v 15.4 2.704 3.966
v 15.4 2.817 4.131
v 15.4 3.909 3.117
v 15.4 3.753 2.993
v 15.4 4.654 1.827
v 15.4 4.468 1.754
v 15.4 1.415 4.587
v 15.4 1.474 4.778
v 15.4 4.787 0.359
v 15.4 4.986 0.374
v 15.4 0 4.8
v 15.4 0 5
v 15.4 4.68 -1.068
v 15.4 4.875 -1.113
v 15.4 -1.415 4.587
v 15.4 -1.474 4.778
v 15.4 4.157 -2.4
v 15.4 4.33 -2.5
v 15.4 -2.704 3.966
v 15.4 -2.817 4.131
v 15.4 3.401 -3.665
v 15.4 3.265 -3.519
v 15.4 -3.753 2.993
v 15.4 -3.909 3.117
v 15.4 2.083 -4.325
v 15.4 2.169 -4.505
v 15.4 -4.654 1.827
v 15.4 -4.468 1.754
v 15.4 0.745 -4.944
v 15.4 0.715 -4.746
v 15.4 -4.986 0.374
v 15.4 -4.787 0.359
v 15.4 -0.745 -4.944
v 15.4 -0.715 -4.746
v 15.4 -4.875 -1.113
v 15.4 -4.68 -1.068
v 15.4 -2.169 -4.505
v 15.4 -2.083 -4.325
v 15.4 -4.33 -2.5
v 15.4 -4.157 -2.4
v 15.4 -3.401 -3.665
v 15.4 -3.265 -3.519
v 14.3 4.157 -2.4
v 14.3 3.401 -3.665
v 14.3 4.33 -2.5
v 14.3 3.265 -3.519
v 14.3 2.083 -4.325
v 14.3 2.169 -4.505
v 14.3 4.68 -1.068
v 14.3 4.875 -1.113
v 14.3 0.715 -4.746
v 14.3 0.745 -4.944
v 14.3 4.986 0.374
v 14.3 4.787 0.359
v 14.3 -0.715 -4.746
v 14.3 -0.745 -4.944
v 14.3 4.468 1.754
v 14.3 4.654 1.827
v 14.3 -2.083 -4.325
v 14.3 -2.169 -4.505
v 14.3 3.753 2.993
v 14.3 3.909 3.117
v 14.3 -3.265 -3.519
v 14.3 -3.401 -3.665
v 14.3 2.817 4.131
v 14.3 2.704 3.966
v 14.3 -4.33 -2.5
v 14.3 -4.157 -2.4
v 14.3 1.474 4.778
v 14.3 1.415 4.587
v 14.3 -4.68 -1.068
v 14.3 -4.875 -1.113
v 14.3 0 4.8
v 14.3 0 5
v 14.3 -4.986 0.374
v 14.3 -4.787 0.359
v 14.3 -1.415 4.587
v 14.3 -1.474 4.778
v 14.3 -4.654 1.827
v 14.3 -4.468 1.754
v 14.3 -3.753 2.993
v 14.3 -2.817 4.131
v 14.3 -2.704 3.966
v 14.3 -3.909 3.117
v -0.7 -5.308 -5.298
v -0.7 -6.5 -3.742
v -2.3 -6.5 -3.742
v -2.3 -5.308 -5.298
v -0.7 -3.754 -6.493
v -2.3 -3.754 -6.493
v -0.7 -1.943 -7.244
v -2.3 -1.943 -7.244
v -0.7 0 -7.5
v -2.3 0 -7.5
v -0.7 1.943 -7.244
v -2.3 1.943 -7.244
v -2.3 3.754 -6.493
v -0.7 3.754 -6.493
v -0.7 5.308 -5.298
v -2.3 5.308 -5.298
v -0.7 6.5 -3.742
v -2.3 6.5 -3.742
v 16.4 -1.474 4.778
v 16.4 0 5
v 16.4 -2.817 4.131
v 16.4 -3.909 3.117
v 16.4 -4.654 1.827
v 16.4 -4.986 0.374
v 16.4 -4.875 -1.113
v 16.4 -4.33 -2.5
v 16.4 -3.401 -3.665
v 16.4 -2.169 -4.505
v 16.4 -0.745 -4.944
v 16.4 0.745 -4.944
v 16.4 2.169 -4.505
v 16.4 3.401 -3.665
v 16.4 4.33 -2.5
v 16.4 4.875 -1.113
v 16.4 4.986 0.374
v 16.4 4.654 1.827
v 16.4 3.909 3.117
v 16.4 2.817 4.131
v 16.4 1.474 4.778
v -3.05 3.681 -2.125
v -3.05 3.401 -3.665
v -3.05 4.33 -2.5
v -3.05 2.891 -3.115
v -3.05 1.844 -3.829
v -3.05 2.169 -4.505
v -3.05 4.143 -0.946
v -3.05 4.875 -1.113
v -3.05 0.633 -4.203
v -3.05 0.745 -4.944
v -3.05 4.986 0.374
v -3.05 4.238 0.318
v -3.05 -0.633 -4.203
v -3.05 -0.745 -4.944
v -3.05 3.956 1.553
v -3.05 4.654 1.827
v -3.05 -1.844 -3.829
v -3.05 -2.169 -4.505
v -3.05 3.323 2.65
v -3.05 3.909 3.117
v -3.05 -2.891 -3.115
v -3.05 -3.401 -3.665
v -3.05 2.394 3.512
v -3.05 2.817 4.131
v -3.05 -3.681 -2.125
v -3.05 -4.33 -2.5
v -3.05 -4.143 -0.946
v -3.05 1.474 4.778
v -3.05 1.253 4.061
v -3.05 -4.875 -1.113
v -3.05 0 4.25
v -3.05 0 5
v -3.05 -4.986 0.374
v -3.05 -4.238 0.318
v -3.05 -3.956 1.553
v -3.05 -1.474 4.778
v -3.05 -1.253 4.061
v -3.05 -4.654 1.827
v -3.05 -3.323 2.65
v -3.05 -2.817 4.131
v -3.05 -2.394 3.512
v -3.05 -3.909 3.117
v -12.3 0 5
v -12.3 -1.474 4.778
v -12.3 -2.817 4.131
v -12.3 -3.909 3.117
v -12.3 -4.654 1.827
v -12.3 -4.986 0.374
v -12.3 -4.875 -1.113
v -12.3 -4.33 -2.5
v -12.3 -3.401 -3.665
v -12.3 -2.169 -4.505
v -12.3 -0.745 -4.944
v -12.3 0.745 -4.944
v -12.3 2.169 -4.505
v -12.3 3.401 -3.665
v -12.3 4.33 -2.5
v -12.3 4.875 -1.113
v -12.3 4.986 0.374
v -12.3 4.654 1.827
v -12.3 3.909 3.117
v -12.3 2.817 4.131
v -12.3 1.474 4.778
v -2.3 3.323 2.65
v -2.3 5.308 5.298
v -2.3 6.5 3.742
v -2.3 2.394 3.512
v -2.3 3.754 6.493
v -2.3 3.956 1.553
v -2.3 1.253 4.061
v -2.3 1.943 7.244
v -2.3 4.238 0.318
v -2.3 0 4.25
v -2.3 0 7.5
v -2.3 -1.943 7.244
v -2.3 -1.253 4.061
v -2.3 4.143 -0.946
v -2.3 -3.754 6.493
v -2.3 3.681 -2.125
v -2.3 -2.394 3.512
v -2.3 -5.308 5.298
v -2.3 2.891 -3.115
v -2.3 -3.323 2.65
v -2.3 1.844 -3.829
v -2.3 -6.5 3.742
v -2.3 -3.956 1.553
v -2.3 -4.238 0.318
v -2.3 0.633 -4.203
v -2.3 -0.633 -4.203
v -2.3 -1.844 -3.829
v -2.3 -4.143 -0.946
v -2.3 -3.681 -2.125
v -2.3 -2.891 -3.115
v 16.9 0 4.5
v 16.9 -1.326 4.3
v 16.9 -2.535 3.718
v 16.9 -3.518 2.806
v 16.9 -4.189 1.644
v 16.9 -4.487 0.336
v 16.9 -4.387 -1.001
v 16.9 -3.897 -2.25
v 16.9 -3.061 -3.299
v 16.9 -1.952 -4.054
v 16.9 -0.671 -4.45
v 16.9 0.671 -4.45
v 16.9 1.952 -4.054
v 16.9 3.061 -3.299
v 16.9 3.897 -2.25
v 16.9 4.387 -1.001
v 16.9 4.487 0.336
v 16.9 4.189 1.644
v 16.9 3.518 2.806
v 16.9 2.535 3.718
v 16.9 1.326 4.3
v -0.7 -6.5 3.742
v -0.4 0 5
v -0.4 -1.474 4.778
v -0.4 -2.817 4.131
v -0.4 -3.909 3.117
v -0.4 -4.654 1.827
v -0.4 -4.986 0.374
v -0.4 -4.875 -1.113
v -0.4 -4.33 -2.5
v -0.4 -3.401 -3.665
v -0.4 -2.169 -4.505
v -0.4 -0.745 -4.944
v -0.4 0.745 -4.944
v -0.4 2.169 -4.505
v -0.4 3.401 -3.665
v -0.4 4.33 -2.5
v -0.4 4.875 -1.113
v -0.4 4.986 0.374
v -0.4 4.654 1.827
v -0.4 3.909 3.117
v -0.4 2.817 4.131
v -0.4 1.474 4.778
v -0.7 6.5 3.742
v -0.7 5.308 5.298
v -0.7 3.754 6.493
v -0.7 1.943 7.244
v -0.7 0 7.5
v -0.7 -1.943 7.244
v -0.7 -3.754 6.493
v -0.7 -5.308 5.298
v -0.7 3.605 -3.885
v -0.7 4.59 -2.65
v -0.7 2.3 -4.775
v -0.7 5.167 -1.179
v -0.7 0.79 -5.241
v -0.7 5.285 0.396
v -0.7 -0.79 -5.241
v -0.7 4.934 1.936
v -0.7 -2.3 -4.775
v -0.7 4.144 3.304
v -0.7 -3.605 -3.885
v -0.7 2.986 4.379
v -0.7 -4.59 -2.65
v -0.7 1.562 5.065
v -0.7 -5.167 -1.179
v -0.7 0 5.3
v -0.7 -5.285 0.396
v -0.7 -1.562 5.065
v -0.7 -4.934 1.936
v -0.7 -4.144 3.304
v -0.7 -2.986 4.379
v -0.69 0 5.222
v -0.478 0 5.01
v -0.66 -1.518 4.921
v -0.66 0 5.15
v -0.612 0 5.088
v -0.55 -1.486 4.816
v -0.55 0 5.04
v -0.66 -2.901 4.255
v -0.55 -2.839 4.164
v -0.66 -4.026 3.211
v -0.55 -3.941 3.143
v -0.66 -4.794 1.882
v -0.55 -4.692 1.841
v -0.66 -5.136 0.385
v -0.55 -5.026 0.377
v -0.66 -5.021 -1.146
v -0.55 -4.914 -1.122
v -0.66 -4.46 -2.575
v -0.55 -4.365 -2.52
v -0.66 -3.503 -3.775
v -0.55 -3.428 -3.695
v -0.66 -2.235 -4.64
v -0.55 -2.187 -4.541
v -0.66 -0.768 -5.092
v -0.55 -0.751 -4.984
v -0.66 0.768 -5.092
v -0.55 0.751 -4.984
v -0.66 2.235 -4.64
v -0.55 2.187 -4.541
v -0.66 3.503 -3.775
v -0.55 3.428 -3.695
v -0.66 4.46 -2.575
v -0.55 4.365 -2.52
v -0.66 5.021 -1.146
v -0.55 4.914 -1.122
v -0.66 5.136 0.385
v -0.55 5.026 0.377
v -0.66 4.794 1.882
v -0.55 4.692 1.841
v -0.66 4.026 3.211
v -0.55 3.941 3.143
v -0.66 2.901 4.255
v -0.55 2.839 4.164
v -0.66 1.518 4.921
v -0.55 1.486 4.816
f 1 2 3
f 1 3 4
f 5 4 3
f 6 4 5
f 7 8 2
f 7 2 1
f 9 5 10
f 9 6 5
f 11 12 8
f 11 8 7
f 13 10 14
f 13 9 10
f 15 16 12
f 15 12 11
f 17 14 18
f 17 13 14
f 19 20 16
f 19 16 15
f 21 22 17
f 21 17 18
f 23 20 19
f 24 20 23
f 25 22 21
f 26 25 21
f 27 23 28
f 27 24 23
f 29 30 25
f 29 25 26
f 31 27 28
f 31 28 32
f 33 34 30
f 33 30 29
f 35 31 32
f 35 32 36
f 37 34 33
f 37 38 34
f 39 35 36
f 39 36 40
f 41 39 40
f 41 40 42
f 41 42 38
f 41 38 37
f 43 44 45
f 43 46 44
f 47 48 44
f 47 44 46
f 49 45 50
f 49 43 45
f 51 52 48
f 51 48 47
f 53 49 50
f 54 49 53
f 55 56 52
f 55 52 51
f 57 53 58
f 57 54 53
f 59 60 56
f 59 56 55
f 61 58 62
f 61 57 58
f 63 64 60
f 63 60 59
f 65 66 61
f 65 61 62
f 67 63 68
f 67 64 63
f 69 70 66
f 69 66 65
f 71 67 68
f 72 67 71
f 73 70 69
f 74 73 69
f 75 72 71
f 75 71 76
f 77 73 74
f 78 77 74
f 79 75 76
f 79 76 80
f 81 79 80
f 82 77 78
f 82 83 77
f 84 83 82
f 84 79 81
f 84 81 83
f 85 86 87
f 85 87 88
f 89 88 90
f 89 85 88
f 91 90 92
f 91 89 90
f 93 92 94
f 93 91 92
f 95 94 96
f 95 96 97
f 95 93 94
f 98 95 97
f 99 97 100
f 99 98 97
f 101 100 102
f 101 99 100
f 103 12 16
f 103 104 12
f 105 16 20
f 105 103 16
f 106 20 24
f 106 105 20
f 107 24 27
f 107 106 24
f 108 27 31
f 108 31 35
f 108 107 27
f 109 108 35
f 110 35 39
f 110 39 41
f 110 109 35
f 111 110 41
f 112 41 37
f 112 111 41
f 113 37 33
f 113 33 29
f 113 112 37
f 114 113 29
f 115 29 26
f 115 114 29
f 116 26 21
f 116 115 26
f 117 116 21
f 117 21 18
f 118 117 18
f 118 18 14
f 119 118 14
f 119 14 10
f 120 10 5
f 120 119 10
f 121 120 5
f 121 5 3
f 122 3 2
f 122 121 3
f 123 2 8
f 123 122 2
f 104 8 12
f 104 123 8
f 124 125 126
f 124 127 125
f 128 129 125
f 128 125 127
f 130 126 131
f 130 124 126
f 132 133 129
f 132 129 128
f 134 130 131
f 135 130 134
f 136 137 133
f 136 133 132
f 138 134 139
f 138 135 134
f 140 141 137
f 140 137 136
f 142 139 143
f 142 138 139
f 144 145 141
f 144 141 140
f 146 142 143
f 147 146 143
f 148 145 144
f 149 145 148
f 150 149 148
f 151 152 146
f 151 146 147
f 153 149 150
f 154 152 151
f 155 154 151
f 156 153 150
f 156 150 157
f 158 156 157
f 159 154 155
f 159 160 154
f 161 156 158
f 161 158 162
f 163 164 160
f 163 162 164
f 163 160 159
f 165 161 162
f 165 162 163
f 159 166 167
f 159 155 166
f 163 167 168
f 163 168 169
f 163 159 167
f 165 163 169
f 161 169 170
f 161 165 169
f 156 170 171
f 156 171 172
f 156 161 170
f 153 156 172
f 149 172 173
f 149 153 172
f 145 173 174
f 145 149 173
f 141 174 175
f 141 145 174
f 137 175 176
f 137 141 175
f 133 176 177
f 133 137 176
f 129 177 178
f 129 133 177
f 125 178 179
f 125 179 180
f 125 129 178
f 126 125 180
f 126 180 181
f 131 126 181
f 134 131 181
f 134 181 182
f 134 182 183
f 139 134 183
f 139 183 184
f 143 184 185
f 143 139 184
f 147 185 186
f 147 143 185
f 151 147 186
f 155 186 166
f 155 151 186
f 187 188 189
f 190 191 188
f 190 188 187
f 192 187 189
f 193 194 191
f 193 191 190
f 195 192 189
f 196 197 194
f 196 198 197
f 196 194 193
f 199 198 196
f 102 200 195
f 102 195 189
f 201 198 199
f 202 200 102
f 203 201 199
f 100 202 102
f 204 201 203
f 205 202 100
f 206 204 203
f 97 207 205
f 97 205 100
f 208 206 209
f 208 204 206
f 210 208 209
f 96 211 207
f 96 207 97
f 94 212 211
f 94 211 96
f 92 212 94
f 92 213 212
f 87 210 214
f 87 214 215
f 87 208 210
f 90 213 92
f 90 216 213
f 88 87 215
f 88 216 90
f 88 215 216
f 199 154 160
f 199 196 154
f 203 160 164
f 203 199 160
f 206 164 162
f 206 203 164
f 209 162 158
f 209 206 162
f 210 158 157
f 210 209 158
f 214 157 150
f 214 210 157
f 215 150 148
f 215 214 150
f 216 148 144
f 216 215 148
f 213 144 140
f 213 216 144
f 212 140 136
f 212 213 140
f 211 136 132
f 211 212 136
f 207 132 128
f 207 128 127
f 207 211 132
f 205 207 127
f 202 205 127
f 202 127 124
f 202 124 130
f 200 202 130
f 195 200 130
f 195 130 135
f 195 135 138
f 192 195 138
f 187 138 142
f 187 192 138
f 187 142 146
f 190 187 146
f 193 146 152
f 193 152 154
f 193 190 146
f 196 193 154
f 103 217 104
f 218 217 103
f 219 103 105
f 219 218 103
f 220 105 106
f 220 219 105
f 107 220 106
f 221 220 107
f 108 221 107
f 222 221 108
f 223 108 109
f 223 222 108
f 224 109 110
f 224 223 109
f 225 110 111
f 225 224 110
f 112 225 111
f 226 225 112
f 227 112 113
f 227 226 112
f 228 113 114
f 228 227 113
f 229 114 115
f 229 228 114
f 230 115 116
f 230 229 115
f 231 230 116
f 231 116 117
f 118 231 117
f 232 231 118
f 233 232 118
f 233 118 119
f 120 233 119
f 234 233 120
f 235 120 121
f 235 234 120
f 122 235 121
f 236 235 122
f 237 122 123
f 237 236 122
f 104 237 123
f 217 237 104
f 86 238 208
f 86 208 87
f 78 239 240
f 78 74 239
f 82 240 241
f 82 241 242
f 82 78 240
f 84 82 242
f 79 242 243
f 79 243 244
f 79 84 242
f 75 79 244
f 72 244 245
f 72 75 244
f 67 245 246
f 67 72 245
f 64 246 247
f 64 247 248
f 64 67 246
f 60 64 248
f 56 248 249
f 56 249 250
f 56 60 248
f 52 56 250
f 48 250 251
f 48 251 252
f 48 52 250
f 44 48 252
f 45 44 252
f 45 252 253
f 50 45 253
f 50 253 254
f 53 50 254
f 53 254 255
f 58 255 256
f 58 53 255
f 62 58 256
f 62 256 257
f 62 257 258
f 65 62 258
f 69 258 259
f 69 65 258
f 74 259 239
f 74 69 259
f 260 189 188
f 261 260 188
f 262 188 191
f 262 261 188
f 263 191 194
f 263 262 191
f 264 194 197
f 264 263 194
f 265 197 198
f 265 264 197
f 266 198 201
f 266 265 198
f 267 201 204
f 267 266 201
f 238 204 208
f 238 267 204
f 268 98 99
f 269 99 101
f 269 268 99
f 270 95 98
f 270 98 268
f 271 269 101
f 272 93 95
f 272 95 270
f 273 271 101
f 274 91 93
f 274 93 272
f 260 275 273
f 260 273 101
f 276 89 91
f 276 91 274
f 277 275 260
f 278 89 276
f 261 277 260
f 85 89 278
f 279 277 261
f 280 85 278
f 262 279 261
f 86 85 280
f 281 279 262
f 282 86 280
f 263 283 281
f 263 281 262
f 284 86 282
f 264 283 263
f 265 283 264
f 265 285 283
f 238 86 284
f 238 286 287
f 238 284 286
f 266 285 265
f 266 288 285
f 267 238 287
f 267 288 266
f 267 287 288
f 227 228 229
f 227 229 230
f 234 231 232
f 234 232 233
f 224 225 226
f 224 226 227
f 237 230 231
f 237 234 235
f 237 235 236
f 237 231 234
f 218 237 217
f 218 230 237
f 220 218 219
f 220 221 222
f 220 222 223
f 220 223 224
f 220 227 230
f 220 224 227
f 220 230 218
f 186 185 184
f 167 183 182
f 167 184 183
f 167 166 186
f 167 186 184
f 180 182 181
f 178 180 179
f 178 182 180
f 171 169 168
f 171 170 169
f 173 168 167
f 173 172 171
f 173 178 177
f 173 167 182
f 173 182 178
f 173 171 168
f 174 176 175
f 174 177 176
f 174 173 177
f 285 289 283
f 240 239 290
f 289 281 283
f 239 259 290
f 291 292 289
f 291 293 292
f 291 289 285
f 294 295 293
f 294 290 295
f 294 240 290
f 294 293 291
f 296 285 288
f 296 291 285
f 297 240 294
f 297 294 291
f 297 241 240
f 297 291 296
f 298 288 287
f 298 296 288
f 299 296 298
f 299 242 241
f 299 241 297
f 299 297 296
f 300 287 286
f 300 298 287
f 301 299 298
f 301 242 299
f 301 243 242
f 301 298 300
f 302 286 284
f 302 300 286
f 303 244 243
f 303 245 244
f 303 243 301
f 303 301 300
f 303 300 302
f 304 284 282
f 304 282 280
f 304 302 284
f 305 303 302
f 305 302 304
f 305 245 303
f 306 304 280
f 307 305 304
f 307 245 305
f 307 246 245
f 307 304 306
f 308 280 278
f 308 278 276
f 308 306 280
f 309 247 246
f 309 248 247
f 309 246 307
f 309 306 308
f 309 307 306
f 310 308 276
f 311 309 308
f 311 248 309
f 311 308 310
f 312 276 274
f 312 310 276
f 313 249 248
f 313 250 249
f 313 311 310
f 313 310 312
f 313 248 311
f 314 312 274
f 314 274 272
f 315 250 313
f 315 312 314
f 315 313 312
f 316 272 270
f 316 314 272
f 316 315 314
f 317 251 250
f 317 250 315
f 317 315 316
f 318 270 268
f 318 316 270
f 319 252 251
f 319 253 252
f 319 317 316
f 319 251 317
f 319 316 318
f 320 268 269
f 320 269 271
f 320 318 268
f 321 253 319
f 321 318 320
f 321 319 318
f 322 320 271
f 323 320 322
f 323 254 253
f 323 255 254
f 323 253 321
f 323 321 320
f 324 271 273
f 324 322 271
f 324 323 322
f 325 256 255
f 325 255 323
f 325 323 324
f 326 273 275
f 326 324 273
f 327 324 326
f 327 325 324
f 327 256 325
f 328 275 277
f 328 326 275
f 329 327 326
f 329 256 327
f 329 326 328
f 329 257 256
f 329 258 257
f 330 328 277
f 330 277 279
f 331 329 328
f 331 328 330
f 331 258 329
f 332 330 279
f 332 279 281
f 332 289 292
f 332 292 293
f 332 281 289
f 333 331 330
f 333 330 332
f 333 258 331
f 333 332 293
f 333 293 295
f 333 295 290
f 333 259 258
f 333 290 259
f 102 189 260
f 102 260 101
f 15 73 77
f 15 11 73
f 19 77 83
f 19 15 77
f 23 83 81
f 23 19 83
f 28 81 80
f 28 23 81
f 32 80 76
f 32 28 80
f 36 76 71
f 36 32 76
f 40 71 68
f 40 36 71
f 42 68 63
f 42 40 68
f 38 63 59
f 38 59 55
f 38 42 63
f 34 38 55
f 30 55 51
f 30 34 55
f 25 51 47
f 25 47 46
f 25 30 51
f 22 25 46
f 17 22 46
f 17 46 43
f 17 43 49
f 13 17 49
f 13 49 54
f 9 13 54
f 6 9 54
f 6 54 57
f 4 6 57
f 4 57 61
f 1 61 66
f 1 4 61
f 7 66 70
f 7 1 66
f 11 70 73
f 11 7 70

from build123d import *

# Parameters (mm, degrees)
SCHNITT_LINEAR_AUSTRAGEN2_DEPTH = 7.5


with BuildPart() as part:
    # Skizze1 → Rotation1 (revolve)
    with BuildSketch(Plane.XY, mode=Mode.PRIVATE) as rotation1_sk:
        with BuildLine():
            Line((14.3, 4.8), (15.4, 4.8))
            Line((15.4, 4.8), (15.4, 5))
            Line((15.4, 5), (16.4, 5))
            Line((16.4, 5), (16.9, 4.5))
            Line((16.9, 4.5), (16.9, 0))
            Line((16.9, 0), (-12.3, 0))
            Line((-12.3, 0), (-12.3, 5))
            Line((-12.3, 5), (-3.05, 5))
            Line((-3.05, 5), (-3.05, 4.25))
            Line((-3.05, 4.25), (-2.3, 4.25))
            Line((-2.3, 4.25), (-2.3, 7.5))
            Line((-2.3, 7.5), (-0.7, 7.5))
            Line((-0.7, 7.5), (-0.7, 5.3))
            ThreePointArc((-0.7, 5.3), (-0.612132034, 5.087867966), (-0.4, 5))
            Line((-0.4, 5), (14.3, 5))
            Line((14.3, 5), (14.3, 4.8))
        make_face()
    revolve(rotation1_sk.sketch.rotate(Axis((-55.671450842, 0, 0), (1, 0, 0)), 90), axis=Axis((-55.671450842, 0, 0), (1, 0, 0)))

    # Skizze5 → Schnitt-Linear austragen2 (cut, symmetric)
    with BuildSketch(Plane(origin=(0, 0, 0), x_dir=(0, 0, -1), z_dir=(1, 0, 0))):
        with BuildLine():
            Line((-3.741657387, 6.5), (3.741657387, 6.5))
            ThreePointArc((3.741657387, 6.5), (0, 7.5), (-3.741657387, 6.5))
        make_face()
        with BuildLine():
            Line((-3.741657387, -6.5), (3.741657387, -6.5))
            ThreePointArc((3.741657387, -6.5), (0, -7.5), (-3.741657387, -6.5))
        make_face()
    extrude(amount=SCHNITT_LINEAR_AUSTRAGEN2_DEPTH, both=True, mode=Mode.SUBTRACT)


solid = part.part
